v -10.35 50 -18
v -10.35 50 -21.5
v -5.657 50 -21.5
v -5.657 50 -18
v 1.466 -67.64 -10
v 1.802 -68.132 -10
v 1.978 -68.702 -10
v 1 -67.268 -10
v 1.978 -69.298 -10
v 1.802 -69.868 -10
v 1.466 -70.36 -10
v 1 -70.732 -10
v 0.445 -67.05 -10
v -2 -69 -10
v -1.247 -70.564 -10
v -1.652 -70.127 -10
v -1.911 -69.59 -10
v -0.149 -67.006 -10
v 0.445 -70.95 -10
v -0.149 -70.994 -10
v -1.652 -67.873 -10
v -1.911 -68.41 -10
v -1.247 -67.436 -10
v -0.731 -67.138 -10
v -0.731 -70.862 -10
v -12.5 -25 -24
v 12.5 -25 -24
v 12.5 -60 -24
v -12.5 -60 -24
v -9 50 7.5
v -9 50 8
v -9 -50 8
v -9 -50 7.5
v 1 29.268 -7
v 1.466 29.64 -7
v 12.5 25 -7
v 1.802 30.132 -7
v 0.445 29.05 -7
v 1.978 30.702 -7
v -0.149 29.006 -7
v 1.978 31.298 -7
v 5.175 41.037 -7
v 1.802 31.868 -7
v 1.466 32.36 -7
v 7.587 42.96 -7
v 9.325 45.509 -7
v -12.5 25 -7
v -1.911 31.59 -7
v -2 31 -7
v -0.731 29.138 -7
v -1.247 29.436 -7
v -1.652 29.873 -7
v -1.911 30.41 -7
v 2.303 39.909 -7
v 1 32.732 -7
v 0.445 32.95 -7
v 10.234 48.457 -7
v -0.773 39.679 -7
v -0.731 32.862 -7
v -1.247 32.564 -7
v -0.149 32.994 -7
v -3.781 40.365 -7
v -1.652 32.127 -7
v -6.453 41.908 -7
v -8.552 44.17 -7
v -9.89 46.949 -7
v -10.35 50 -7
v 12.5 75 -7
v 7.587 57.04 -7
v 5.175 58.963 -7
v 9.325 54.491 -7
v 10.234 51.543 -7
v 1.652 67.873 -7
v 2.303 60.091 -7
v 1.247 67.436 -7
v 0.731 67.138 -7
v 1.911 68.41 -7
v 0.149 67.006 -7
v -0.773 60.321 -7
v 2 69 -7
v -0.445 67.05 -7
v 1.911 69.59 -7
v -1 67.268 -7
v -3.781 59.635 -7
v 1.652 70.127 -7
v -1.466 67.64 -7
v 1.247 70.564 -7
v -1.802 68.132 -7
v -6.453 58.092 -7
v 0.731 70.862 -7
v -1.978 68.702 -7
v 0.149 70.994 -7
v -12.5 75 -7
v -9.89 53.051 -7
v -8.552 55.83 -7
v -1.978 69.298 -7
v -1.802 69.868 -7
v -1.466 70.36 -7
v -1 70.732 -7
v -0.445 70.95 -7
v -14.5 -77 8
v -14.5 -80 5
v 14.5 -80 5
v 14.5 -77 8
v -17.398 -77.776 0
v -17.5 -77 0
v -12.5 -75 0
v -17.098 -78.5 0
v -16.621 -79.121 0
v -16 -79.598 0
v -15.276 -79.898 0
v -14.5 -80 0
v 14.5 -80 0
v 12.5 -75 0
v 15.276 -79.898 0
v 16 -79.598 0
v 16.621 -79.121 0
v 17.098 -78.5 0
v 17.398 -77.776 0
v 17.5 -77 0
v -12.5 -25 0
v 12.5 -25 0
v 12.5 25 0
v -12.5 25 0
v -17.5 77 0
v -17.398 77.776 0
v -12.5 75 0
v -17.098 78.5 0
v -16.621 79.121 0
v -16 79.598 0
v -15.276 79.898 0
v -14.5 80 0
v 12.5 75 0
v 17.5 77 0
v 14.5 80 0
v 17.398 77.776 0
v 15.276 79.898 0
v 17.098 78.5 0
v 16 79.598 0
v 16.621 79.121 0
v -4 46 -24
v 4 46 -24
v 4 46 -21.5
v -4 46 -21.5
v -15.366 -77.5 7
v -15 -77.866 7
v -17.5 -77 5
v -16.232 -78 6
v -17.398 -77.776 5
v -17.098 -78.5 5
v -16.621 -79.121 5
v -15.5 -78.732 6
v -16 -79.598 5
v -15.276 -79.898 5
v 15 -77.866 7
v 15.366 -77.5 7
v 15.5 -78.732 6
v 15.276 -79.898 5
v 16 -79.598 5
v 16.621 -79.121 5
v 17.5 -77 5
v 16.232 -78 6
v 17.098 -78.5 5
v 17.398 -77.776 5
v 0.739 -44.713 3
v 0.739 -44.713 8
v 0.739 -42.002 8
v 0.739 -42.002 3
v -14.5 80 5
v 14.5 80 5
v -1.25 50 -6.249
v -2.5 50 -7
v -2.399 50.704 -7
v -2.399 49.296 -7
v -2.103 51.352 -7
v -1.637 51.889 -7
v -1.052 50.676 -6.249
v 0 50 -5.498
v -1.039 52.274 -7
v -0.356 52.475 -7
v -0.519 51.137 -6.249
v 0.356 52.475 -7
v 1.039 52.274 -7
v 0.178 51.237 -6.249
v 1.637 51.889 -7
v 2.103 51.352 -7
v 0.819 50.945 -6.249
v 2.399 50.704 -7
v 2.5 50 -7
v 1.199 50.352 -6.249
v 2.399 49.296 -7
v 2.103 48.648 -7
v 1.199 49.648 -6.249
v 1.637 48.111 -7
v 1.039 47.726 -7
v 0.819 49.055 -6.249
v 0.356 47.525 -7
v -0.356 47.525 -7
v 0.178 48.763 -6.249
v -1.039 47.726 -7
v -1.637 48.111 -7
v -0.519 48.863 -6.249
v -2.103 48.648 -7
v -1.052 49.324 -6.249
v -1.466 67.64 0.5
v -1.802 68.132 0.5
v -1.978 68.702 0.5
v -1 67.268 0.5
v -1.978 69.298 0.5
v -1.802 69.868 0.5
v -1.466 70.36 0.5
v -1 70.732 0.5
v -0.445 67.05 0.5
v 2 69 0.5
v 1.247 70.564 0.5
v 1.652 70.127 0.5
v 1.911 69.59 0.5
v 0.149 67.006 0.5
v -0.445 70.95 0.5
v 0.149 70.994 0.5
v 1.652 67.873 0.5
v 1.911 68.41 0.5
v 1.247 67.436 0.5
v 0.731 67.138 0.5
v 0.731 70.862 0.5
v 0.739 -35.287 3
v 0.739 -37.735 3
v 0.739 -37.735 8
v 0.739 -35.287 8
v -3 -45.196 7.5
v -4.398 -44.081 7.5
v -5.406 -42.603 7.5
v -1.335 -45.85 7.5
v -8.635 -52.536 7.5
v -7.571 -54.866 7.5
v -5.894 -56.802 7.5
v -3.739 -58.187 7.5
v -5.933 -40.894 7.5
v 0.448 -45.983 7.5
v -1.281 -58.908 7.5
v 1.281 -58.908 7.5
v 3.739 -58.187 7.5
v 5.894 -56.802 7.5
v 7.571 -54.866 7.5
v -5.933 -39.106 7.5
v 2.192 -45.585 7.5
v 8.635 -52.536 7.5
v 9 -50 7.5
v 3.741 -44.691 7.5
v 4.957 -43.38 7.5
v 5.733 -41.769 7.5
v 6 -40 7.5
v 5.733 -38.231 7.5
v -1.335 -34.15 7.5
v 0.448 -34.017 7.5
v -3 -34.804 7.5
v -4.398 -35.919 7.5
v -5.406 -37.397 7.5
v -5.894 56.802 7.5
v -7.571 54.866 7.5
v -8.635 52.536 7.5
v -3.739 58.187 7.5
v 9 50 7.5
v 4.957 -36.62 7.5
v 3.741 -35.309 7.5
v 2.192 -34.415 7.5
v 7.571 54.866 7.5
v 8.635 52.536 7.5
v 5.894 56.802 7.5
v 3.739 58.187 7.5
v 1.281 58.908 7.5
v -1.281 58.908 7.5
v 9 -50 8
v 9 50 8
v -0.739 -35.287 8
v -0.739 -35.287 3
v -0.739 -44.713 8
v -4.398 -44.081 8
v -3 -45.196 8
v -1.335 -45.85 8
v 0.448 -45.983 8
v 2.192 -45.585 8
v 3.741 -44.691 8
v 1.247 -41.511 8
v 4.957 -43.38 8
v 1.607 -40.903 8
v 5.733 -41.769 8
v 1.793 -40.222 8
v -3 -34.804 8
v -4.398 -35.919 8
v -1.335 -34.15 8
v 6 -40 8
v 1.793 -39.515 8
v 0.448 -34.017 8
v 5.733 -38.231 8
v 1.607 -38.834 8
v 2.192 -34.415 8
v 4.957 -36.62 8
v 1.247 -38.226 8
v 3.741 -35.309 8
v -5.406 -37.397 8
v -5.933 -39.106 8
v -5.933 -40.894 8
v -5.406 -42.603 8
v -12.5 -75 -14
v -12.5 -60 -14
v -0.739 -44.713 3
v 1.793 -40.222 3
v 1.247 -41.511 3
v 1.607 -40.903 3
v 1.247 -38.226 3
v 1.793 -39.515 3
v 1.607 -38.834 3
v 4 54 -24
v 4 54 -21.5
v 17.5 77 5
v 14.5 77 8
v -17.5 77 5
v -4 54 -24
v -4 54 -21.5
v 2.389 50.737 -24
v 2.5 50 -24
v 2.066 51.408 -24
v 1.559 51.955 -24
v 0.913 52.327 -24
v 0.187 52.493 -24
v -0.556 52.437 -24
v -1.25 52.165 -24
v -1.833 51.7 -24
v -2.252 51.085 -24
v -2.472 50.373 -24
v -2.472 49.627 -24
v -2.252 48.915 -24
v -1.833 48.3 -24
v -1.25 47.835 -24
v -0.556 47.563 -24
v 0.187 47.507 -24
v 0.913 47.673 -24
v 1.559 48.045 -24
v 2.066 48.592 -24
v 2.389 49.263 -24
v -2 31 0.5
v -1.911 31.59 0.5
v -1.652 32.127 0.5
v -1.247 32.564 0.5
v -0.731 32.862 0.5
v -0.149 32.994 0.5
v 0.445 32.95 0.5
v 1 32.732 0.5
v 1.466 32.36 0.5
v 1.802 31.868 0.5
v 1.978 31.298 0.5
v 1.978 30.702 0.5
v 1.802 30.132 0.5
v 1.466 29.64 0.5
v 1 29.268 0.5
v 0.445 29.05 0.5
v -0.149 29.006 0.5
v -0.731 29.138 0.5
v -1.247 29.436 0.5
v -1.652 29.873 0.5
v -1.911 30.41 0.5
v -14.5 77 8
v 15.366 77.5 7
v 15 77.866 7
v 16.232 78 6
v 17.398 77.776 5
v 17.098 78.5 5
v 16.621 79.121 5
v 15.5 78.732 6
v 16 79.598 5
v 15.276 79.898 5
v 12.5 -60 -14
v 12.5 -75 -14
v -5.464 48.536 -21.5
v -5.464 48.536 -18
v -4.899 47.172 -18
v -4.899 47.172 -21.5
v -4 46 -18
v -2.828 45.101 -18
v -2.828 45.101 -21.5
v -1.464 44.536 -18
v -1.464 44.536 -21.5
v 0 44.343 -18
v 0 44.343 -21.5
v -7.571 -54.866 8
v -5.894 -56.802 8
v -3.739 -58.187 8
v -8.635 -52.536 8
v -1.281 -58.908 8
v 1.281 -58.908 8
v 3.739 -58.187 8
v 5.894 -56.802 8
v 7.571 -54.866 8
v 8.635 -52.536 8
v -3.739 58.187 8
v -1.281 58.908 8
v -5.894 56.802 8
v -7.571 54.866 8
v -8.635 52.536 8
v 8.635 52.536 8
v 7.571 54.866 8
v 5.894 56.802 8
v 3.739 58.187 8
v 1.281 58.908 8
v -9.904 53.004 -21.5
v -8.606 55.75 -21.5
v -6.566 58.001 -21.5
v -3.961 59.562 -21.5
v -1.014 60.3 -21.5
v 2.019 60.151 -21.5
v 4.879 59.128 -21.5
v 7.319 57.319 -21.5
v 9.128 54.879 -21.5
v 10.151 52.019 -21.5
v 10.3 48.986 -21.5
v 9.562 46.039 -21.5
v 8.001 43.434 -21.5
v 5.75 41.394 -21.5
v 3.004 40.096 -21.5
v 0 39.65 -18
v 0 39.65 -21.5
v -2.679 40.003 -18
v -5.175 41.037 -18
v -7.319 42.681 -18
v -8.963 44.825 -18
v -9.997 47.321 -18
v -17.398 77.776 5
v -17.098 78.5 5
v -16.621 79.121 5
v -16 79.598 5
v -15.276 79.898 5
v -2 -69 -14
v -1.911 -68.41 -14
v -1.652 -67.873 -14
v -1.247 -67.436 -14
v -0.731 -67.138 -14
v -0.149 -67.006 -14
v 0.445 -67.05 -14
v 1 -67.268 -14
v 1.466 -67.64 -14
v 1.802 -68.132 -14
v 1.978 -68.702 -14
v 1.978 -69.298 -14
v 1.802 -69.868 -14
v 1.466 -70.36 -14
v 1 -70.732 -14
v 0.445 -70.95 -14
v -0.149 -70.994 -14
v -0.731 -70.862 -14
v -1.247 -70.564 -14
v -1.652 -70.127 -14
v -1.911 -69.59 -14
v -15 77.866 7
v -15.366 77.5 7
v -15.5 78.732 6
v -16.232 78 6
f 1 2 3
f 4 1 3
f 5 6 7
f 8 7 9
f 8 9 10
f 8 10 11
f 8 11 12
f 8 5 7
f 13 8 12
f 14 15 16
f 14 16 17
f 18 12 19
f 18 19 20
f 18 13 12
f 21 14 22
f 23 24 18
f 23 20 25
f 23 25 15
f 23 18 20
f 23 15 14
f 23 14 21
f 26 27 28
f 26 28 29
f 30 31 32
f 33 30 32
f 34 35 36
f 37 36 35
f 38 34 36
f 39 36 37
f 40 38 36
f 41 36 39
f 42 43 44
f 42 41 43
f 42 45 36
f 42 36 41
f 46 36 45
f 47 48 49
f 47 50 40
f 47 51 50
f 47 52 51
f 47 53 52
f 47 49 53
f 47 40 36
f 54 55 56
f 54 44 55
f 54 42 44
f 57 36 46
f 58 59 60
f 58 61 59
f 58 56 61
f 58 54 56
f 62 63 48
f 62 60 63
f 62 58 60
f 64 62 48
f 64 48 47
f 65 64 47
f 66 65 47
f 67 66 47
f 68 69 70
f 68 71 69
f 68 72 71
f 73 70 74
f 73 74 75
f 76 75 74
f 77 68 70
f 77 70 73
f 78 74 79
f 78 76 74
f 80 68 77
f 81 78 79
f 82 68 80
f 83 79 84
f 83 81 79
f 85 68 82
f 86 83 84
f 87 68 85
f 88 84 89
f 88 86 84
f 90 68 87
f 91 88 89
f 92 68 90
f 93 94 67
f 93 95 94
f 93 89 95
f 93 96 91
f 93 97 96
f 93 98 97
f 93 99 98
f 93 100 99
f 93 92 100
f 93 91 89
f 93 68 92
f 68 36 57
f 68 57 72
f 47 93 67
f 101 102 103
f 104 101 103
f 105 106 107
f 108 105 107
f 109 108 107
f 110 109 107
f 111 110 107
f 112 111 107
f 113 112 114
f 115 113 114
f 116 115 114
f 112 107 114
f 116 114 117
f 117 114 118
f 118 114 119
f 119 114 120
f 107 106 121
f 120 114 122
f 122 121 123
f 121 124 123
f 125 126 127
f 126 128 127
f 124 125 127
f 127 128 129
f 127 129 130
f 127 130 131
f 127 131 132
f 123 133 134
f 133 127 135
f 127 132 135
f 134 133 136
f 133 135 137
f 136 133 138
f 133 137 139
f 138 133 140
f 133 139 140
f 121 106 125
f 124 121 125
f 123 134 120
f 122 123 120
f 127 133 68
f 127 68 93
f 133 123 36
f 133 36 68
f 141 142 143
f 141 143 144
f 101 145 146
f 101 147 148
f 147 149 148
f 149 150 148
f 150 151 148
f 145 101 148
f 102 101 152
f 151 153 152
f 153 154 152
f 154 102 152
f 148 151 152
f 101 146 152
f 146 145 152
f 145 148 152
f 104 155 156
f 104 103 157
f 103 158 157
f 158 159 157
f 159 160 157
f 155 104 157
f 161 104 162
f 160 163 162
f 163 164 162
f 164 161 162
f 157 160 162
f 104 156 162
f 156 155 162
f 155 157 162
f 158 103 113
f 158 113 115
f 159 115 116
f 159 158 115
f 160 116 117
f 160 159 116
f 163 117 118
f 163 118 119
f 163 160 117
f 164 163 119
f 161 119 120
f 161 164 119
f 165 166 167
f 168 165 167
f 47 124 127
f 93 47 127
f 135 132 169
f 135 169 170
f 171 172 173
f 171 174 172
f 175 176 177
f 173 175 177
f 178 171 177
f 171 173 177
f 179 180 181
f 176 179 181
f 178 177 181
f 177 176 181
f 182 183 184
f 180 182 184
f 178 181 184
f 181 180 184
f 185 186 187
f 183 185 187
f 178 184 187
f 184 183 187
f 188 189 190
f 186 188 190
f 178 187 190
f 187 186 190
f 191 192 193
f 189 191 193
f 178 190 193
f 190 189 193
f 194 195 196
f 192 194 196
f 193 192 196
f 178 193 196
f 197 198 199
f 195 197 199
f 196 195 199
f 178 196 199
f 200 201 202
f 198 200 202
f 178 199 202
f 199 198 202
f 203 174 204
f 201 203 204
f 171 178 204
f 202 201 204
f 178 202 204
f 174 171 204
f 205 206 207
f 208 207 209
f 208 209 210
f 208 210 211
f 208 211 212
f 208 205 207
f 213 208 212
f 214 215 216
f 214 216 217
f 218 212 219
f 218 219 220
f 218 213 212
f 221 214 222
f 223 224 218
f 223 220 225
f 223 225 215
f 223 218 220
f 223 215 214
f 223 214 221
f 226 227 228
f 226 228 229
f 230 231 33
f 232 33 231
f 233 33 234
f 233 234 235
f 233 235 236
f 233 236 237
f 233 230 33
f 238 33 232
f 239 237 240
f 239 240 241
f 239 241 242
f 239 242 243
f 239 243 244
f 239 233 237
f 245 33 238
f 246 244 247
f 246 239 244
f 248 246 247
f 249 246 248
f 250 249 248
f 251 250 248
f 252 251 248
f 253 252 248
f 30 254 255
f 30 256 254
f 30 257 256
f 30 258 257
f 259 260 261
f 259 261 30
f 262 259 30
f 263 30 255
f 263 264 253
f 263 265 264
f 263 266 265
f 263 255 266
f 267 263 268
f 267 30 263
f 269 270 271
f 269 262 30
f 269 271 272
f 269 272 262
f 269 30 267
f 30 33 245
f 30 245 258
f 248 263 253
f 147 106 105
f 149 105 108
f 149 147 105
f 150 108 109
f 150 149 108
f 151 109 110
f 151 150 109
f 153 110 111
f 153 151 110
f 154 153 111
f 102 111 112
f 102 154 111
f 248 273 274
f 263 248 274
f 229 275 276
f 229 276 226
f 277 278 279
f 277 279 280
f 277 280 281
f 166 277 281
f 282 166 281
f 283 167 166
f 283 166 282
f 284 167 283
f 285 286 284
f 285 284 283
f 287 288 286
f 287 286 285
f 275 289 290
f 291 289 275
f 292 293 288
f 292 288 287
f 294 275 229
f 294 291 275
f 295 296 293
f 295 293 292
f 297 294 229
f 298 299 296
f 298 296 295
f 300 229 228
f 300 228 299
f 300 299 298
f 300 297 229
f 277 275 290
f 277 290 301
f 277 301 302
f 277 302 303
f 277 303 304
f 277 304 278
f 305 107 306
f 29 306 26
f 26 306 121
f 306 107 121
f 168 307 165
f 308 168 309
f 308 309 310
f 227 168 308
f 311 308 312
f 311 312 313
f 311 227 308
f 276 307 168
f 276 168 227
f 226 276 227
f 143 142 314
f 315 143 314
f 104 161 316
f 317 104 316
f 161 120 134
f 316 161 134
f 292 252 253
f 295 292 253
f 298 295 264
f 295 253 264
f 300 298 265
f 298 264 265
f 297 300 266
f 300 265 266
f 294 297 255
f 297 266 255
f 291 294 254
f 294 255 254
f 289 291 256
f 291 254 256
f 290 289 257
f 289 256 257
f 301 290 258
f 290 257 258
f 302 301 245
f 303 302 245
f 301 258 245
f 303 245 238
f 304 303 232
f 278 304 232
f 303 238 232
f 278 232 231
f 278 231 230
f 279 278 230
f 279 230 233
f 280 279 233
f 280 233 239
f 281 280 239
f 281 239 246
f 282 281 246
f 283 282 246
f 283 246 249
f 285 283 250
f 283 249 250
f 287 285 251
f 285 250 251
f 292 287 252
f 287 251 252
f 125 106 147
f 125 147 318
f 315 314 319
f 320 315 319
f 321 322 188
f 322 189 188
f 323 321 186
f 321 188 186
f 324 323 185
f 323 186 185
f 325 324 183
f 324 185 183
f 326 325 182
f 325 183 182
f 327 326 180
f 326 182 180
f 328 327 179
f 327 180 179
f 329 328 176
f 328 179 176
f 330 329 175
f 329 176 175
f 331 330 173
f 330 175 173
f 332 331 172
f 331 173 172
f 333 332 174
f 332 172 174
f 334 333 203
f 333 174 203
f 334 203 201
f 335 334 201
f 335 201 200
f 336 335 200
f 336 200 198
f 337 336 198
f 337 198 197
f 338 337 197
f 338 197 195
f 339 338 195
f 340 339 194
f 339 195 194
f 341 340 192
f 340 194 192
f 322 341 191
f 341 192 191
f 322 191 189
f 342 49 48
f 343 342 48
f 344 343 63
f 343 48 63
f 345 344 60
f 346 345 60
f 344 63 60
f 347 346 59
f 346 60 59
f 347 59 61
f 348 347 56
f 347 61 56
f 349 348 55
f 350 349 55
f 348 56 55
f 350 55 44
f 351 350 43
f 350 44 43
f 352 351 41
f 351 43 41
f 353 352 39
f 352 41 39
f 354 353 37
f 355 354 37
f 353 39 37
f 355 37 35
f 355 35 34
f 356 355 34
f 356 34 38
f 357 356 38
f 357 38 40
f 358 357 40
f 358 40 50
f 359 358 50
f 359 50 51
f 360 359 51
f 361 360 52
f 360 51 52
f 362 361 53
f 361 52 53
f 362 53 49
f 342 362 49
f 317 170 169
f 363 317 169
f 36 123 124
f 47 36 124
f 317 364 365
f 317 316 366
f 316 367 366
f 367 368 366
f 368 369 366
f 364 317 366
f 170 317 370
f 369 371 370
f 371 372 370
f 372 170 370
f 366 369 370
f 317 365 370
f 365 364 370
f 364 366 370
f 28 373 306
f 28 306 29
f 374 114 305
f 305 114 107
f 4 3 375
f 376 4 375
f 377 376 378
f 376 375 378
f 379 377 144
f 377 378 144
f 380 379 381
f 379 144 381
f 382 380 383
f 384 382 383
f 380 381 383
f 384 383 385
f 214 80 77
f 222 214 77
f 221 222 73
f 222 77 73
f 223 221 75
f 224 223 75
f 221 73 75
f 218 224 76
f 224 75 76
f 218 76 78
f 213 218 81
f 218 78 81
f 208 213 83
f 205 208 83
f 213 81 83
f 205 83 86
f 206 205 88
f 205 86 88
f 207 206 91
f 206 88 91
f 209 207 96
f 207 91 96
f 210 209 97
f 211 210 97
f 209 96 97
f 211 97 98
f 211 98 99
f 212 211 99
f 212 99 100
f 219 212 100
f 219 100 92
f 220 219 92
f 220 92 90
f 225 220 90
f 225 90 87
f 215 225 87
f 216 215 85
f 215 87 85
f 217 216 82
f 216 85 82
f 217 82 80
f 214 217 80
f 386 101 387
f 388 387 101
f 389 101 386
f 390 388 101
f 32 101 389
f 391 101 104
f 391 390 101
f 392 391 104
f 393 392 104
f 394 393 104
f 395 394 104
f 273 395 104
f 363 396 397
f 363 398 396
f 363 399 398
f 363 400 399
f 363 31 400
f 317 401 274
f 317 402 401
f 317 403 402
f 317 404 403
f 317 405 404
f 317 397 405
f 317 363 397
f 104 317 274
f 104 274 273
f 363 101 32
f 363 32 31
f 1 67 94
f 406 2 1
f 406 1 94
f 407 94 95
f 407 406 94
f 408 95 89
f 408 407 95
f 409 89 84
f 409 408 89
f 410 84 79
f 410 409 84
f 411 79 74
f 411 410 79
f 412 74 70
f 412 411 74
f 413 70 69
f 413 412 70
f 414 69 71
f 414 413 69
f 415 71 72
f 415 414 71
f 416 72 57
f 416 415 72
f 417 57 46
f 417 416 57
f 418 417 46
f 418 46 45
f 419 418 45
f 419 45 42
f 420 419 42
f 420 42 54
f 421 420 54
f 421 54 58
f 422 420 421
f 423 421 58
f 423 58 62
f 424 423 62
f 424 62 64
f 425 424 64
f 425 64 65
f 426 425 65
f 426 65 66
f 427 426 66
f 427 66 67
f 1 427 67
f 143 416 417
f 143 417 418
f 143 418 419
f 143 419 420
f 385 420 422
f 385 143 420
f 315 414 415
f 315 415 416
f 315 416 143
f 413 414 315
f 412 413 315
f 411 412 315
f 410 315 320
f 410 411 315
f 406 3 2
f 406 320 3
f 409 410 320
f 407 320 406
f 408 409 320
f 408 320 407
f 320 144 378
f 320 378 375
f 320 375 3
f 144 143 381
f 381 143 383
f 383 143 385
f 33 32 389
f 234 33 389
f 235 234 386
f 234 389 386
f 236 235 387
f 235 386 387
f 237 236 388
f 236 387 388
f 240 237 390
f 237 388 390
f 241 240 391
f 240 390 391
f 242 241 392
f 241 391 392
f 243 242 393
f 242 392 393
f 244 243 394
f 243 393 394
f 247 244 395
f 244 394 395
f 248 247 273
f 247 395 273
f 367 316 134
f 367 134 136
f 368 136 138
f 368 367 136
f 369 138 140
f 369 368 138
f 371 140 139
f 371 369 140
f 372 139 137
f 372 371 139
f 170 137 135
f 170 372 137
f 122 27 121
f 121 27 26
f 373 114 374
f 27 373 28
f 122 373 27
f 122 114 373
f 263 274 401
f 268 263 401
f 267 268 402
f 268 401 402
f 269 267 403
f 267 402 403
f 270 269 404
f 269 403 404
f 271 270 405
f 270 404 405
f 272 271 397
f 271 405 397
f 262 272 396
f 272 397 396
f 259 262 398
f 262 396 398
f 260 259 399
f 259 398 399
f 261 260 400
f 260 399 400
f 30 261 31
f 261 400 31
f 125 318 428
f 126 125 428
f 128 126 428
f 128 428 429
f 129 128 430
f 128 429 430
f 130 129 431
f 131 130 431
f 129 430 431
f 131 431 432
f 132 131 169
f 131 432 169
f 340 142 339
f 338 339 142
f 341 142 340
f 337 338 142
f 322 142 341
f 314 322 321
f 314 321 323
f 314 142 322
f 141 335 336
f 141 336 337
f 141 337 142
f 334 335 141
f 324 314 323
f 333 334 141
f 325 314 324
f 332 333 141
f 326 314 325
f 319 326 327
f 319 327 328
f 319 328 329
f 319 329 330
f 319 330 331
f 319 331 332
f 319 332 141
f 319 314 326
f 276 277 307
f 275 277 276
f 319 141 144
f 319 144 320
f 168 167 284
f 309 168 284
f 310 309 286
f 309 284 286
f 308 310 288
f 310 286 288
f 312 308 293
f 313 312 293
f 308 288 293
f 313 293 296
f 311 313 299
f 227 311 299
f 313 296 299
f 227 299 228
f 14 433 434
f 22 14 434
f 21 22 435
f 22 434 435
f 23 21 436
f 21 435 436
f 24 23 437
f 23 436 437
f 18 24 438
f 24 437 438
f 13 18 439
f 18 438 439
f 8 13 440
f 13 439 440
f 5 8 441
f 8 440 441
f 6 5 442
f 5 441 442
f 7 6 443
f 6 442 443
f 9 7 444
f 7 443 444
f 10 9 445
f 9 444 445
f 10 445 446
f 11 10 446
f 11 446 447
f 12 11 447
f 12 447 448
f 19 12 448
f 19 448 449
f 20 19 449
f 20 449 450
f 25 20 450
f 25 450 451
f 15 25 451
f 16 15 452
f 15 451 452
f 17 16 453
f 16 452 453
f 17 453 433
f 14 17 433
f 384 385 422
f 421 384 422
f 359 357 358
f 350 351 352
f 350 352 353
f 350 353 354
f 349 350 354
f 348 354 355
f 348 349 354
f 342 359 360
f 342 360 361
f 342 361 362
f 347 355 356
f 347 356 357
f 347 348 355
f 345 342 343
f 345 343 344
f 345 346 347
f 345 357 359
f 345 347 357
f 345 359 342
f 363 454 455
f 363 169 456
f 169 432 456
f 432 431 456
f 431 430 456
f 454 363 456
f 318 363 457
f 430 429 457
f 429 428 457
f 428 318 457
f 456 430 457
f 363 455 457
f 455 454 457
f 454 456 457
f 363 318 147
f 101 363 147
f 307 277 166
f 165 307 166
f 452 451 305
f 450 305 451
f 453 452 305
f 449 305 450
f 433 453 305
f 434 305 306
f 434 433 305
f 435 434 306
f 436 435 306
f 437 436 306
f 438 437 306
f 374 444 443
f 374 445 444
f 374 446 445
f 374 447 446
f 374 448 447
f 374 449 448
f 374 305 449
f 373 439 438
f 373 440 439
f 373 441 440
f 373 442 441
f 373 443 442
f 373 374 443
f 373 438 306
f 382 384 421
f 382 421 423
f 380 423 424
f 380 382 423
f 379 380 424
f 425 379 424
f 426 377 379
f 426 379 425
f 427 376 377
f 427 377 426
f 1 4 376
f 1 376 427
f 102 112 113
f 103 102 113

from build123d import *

# Parameters (mm, degrees)
SKETCH_1_W            = 35
SKETCH_1_H            = 160
EXTRUDE_1_DEPTH       = 8
FILLET_1_R            = 3
CHAMFER_1_SIZE        = 3
CUT_EXTRUDE_1_DEPTH   = 0.5
SKETCH_3_R            = 6
EXTRUDE_2_DEPTH       = 0.5
SKETCH_4_W            = 25
SKETCH_4_H            = 150
EXTRUDE_3_DEPTH       = 24
SKETCH_6_W            = 25
SKETCH_6_H            = 50
CUT_EXTRUDE_3_DEPTH   = 24
SKETCH_8_W            = 10
SKETCH_8_H            = 15
CUT_EXTRUDE_4_DEPTH   = 89.746830929
SKETCH_9_W            = 25
SKETCH_9_H            = 50
SKETCH_9_R            = 10.35
CUT_EXTRUDE_5_DEPTH   = 24
SKETCH_10_R           = 2
CUT_EXTRUDE_6_DEPTH   = 4
SKETCH_11_W           = 25
SKETCH_11_H           = 50
EXTRUDE_2_2_DEPTH     = 7
SKETCH_12_W           = 1.47707906
SKETCH_12_H           = 9.426983126
CUT_EXTRUDE_7_DEPTH   = 5
HOLE_WIZARD_M61_D     = 5
HOLE_WIZARD_M61_DEPTH = 17
HOLE_WIZARD_M61_TIP   = 1.502151548
SKETCH_16_R           = 2
CUT_EXTRUDE_8_DEPTH   = 7.5
SKETCH_17_R           = 10.35
SKETCH_17_W           = 8
SKETCH_17_H           = 8
CUT_EXTRUDE_9_DEPTH   = 2.5
CUT_EXTRUDE_10_DEPTH  = 3.5


with BuildPart() as part:
    # Эскиз1 → Вытянуть1 (new body)
    with BuildSketch(Plane.XY):
        Rectangle(SKETCH_1_W, SKETCH_1_H)
    extrude(amount=EXTRUDE_1_DEPTH)

    # Скругление1
    fillet_1_edges = [part.edges().sort_by_distance(p)[0] for p in [
        (-17.5, 80, 4),
        (17.5, 80, 4),
        (17.5, -80, 4),
        (-17.5, -80, 4),
    ]]
    fillet(fillet_1_edges, radius=FILLET_1_R)

    # Фаска1
    chamfer_1_edges = [part.edges().sort_by_distance(p)[0] for p in [
        (0, -80, 8),
        (-17.5, 0, 8),
        (17.5, 0, 8),
        (0, 80, 8),
        (16.621320344, 79.121320344, 8),
        (-16.621320344, 79.121320344, 8),
        (16.621320344, -79.121320344, 8),
        (-16.621320344, -79.121320344, 8),
    ]]
    chamfer(chamfer_1_edges, length=CHAMFER_1_SIZE)

    # Эскиз2 → Вырез-Вытянуть1 (cut)
    with BuildSketch(Plane.XY.offset(8)):
        with BuildLine():
            Line((-9, 50), (-9, -50))
            ThreePointArc((-9, -50), (0, -59), (9, -50))
            Line((9, -50), (9, 50))
            ThreePointArc((9, 50), (0, 59), (-9, 50))
        make_face()
    extrude(amount=-CUT_EXTRUDE_1_DEPTH, mode=Mode.SUBTRACT)

    # Эскиз3 → Extrude 2 (add)
    with BuildSketch(Plane.XY.offset(7.5)):
        with Locations((0, -40)):
            Circle(SKETCH_3_R)
    extrude(amount=EXTRUDE_2_DEPTH)

    # Эскиз4 → Вытянуть3 (add)
    with BuildSketch(Plane(origin=(0, 0, 0), x_dir=(-1, 0, 0), z_dir=(0, 0, -1))):
        Rectangle(SKETCH_4_W, SKETCH_4_H)
    extrude(amount=EXTRUDE_3_DEPTH)

    # Эскиз6 → Вырез-Вытянуть3 (cut)
    with BuildSketch(Plane(origin=(0, 0, -24), x_dir=(-1, 0, 0), z_dir=(0, 0, -1))):
        Rectangle(SKETCH_6_W, SKETCH_6_H)
    extrude(amount=-CUT_EXTRUDE_3_DEPTH, mode=Mode.SUBTRACT)

    # Эскиз8 → Вырез-Вытянуть4 (cut, through all)
    with BuildSketch(Plane(origin=(12.5, 0, 0), x_dir=(0, 0, -1), z_dir=(1, 0, 0))):
        with Locations((19, -67.5)):
            Rectangle(SKETCH_8_W, SKETCH_8_H)
    extrude(amount=-CUT_EXTRUDE_4_DEPTH, mode=Mode.SUBTRACT)

    # Эскиз9 → Вырез-Вытянуть5 (cut)
    with BuildSketch(Plane(origin=(0, 0, -24), x_dir=(-1, 0, 0), z_dir=(0, 0, -1))):
        with Locations((0, 50)):
            Rectangle(SKETCH_9_W, SKETCH_9_H)
        with Locations((0, 50)):
            Circle(SKETCH_9_R, mode=Mode.SUBTRACT)
    extrude(amount=-CUT_EXTRUDE_5_DEPTH, mode=Mode.SUBTRACT)

    # Эскиз10 → Вырез-Вытянуть6 (cut)
    with BuildSketch(Plane(origin=(0, 0, -14), x_dir=(-1, 0, 0), z_dir=(0, 0, -1))):
        with Locations((0, -69)):
            Circle(SKETCH_10_R)
    extrude(amount=-CUT_EXTRUDE_6_DEPTH, mode=Mode.SUBTRACT)

    # Эскиз11 → Extrude 2 2 (add)
    with BuildSketch(Plane(origin=(0, 0, 0), x_dir=(-1, 0, 0), z_dir=(0, 0, -1))):
        with Locations((0, 50)):
            Rectangle(SKETCH_11_W, SKETCH_11_H)
    extrude(amount=EXTRUDE_2_2_DEPTH)

    # Эскиз12 → Вырез-Вытянуть7 (cut)
    with BuildSketch(Plane.XY.offset(8)):
        with Locations((0, -40)):
            Rectangle(SKETCH_12_W, SKETCH_12_H)
        with BuildLine():
            ThreePointArc((0.73853953, -42.00191483), (1.817071347, -39.86854196), (0.73853953, -37.73516909))
            Line((0.73853953, -37.73516909), (0.73853953, -42.00191483))
        make_face()
    extrude(amount=-CUT_EXTRUDE_7_DEPTH, mode=Mode.SUBTRACT)

    # Отверстие обработанное метчиком M61
    with Locations(Plane(origin=(0, 0, -24), x_dir=(-1, 0, 0), z_dir=(0, 0, -1))):
        with Locations((0, 50)):
            Hole(HOLE_WIZARD_M61_D / 2, depth=HOLE_WIZARD_M61_DEPTH)
            with Locations((0, 0, -(HOLE_WIZARD_M61_DEPTH + HOLE_WIZARD_M61_TIP / 2))):  # 118° drill point
                Cone(0, HOLE_WIZARD_M61_D / 2, HOLE_WIZARD_M61_TIP, mode=Mode.SUBTRACT)

    # Эскиз16 → Вырез-Вытянуть8 (cut)
    with BuildSketch(Plane(origin=(0, 0, -7), x_dir=(-1, 0, 0), z_dir=(0, 0, -1))):
        with Locations((0, 31)):
            Circle(SKETCH_16_R)
        with Locations(Location((0, 69, 0), (0, 0, 180))):
            Circle(SKETCH_16_R)
    extrude(amount=-CUT_EXTRUDE_8_DEPTH, mode=Mode.SUBTRACT)

    # Эскиз17 → Вырез-Вытянуть9 (cut)
    with BuildSketch(Plane(origin=(0, 0, -24), x_dir=(-1, 0, 0), z_dir=(0, 0, -1))):
        with Locations((0, 50)):
            Circle(SKETCH_17_R)
        with Locations((0, 50)):
            Rectangle(SKETCH_17_W, SKETCH_17_H, mode=Mode.SUBTRACT)
    extrude(amount=-CUT_EXTRUDE_9_DEPTH, mode=Mode.SUBTRACT)

    # Эскиз18 → Вырез-Вытянуть10 (cut)
    with BuildSketch(Plane(origin=(0, 0, -21.5), x_dir=(-1, 0, 0), z_dir=(0, 0, -1))):
        with BuildLine():
            Line((0, 44.343145751), (0, 39.65))
            ThreePointArc((0, 39.65), (7.318555185, 42.681444815), (10.35, 50))
            Line((10.35, 50), (5.656854249, 50))
            ThreePointArc((5.656854249, 50), (4, 46), (0, 44.343145751))
        make_face()
    extrude(amount=-CUT_EXTRUDE_10_DEPTH, mode=Mode.SUBTRACT)


solid = part.part
